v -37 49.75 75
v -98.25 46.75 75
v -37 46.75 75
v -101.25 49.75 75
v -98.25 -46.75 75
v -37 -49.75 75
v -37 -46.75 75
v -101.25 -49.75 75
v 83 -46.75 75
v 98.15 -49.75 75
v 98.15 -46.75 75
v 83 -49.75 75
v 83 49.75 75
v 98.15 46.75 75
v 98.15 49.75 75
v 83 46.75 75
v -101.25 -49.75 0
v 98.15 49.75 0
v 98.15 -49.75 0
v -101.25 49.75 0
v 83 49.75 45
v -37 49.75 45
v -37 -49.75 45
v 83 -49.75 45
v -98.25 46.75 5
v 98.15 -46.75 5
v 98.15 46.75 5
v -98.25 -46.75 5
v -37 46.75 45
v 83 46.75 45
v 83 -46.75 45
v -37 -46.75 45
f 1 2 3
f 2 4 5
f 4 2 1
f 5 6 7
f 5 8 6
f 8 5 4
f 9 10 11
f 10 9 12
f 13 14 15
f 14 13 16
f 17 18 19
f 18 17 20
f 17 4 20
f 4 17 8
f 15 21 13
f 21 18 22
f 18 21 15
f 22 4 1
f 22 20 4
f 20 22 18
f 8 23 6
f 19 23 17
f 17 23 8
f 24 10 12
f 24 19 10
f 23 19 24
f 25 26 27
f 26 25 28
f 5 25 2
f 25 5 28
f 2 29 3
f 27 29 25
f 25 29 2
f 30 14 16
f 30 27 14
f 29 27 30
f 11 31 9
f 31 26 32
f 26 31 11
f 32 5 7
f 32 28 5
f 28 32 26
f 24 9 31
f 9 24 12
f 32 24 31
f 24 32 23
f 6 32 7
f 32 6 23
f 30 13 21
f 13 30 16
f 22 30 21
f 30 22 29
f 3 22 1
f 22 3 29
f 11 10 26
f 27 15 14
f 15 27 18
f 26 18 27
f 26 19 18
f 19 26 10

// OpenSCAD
// =======================================
// Caja externa (ajustada a medidas internas dadas)
// =======================================

// hueco interior deseado (para encajar la caja interna)
largo_interno = 196.5;
ancho_interno = 93.5;
alto_interno  = 70;

pared = 3;
base  = 5;

// dimensiones externas calculadas automáticamente
largo = largo_interno + 2*pared; // 202.2
ancho = ancho_interno + 2*pared; // 99.2
alto  = alto_interno + base;      // 70.5

ranura_largo = 120;
ranura_alto  = 30;

// Nueva ranura en la base
ranura_base_largo = 82;
ranura_base_ancho = 54;
ranura_base_espesor = 5;

altura_pared_derecha = 30;

module caja_sin_tapa_centrada(l, a, h, pared, base) {
  difference() {
    // Caja exterior centrada
    translate([-l/2, -a/2, 0])
    cube([l, a, h]);

    // Hueco interior (ajustado: base de 5 mm, paredes de 3 mm)
    translate([-l/2 + pared, -a/2 + pared, base])
    cube([l - 2*pared, a - 2*pared, h]);

    // Ranura lado delantero
    translate([-37, -a/2 - 0.1, h - ranura_alto])
    cube([ranura_largo, pared + 0.2, ranura_alto]);

    // Ranura lado trasero
    translate([-37, a/2 - pared - 0.1, h - ranura_alto])
    cube([ranura_largo, pared + 0.2, ranura_alto]);

    // Ranura en la base (centrada en X=-32.5)
    // translate([-39 - ranura_base_largo/2, -ranura_base_ancho/2, -0.1])
    // cube([ranura_base_largo, ranura_base_ancho, ranura_base_espesor + 0.2]);

    // Eliminar pared lateral derecha
    translate([l/2 - pared - 0.1, -a/2 - 0.1, -0.1])
    cube([pared + 0.2, a + 0.2, h + 0.1]);
    }
}

// Llamada principal
caja_sin_tapa_centrada(largo, ancho, alto, pared, base);
